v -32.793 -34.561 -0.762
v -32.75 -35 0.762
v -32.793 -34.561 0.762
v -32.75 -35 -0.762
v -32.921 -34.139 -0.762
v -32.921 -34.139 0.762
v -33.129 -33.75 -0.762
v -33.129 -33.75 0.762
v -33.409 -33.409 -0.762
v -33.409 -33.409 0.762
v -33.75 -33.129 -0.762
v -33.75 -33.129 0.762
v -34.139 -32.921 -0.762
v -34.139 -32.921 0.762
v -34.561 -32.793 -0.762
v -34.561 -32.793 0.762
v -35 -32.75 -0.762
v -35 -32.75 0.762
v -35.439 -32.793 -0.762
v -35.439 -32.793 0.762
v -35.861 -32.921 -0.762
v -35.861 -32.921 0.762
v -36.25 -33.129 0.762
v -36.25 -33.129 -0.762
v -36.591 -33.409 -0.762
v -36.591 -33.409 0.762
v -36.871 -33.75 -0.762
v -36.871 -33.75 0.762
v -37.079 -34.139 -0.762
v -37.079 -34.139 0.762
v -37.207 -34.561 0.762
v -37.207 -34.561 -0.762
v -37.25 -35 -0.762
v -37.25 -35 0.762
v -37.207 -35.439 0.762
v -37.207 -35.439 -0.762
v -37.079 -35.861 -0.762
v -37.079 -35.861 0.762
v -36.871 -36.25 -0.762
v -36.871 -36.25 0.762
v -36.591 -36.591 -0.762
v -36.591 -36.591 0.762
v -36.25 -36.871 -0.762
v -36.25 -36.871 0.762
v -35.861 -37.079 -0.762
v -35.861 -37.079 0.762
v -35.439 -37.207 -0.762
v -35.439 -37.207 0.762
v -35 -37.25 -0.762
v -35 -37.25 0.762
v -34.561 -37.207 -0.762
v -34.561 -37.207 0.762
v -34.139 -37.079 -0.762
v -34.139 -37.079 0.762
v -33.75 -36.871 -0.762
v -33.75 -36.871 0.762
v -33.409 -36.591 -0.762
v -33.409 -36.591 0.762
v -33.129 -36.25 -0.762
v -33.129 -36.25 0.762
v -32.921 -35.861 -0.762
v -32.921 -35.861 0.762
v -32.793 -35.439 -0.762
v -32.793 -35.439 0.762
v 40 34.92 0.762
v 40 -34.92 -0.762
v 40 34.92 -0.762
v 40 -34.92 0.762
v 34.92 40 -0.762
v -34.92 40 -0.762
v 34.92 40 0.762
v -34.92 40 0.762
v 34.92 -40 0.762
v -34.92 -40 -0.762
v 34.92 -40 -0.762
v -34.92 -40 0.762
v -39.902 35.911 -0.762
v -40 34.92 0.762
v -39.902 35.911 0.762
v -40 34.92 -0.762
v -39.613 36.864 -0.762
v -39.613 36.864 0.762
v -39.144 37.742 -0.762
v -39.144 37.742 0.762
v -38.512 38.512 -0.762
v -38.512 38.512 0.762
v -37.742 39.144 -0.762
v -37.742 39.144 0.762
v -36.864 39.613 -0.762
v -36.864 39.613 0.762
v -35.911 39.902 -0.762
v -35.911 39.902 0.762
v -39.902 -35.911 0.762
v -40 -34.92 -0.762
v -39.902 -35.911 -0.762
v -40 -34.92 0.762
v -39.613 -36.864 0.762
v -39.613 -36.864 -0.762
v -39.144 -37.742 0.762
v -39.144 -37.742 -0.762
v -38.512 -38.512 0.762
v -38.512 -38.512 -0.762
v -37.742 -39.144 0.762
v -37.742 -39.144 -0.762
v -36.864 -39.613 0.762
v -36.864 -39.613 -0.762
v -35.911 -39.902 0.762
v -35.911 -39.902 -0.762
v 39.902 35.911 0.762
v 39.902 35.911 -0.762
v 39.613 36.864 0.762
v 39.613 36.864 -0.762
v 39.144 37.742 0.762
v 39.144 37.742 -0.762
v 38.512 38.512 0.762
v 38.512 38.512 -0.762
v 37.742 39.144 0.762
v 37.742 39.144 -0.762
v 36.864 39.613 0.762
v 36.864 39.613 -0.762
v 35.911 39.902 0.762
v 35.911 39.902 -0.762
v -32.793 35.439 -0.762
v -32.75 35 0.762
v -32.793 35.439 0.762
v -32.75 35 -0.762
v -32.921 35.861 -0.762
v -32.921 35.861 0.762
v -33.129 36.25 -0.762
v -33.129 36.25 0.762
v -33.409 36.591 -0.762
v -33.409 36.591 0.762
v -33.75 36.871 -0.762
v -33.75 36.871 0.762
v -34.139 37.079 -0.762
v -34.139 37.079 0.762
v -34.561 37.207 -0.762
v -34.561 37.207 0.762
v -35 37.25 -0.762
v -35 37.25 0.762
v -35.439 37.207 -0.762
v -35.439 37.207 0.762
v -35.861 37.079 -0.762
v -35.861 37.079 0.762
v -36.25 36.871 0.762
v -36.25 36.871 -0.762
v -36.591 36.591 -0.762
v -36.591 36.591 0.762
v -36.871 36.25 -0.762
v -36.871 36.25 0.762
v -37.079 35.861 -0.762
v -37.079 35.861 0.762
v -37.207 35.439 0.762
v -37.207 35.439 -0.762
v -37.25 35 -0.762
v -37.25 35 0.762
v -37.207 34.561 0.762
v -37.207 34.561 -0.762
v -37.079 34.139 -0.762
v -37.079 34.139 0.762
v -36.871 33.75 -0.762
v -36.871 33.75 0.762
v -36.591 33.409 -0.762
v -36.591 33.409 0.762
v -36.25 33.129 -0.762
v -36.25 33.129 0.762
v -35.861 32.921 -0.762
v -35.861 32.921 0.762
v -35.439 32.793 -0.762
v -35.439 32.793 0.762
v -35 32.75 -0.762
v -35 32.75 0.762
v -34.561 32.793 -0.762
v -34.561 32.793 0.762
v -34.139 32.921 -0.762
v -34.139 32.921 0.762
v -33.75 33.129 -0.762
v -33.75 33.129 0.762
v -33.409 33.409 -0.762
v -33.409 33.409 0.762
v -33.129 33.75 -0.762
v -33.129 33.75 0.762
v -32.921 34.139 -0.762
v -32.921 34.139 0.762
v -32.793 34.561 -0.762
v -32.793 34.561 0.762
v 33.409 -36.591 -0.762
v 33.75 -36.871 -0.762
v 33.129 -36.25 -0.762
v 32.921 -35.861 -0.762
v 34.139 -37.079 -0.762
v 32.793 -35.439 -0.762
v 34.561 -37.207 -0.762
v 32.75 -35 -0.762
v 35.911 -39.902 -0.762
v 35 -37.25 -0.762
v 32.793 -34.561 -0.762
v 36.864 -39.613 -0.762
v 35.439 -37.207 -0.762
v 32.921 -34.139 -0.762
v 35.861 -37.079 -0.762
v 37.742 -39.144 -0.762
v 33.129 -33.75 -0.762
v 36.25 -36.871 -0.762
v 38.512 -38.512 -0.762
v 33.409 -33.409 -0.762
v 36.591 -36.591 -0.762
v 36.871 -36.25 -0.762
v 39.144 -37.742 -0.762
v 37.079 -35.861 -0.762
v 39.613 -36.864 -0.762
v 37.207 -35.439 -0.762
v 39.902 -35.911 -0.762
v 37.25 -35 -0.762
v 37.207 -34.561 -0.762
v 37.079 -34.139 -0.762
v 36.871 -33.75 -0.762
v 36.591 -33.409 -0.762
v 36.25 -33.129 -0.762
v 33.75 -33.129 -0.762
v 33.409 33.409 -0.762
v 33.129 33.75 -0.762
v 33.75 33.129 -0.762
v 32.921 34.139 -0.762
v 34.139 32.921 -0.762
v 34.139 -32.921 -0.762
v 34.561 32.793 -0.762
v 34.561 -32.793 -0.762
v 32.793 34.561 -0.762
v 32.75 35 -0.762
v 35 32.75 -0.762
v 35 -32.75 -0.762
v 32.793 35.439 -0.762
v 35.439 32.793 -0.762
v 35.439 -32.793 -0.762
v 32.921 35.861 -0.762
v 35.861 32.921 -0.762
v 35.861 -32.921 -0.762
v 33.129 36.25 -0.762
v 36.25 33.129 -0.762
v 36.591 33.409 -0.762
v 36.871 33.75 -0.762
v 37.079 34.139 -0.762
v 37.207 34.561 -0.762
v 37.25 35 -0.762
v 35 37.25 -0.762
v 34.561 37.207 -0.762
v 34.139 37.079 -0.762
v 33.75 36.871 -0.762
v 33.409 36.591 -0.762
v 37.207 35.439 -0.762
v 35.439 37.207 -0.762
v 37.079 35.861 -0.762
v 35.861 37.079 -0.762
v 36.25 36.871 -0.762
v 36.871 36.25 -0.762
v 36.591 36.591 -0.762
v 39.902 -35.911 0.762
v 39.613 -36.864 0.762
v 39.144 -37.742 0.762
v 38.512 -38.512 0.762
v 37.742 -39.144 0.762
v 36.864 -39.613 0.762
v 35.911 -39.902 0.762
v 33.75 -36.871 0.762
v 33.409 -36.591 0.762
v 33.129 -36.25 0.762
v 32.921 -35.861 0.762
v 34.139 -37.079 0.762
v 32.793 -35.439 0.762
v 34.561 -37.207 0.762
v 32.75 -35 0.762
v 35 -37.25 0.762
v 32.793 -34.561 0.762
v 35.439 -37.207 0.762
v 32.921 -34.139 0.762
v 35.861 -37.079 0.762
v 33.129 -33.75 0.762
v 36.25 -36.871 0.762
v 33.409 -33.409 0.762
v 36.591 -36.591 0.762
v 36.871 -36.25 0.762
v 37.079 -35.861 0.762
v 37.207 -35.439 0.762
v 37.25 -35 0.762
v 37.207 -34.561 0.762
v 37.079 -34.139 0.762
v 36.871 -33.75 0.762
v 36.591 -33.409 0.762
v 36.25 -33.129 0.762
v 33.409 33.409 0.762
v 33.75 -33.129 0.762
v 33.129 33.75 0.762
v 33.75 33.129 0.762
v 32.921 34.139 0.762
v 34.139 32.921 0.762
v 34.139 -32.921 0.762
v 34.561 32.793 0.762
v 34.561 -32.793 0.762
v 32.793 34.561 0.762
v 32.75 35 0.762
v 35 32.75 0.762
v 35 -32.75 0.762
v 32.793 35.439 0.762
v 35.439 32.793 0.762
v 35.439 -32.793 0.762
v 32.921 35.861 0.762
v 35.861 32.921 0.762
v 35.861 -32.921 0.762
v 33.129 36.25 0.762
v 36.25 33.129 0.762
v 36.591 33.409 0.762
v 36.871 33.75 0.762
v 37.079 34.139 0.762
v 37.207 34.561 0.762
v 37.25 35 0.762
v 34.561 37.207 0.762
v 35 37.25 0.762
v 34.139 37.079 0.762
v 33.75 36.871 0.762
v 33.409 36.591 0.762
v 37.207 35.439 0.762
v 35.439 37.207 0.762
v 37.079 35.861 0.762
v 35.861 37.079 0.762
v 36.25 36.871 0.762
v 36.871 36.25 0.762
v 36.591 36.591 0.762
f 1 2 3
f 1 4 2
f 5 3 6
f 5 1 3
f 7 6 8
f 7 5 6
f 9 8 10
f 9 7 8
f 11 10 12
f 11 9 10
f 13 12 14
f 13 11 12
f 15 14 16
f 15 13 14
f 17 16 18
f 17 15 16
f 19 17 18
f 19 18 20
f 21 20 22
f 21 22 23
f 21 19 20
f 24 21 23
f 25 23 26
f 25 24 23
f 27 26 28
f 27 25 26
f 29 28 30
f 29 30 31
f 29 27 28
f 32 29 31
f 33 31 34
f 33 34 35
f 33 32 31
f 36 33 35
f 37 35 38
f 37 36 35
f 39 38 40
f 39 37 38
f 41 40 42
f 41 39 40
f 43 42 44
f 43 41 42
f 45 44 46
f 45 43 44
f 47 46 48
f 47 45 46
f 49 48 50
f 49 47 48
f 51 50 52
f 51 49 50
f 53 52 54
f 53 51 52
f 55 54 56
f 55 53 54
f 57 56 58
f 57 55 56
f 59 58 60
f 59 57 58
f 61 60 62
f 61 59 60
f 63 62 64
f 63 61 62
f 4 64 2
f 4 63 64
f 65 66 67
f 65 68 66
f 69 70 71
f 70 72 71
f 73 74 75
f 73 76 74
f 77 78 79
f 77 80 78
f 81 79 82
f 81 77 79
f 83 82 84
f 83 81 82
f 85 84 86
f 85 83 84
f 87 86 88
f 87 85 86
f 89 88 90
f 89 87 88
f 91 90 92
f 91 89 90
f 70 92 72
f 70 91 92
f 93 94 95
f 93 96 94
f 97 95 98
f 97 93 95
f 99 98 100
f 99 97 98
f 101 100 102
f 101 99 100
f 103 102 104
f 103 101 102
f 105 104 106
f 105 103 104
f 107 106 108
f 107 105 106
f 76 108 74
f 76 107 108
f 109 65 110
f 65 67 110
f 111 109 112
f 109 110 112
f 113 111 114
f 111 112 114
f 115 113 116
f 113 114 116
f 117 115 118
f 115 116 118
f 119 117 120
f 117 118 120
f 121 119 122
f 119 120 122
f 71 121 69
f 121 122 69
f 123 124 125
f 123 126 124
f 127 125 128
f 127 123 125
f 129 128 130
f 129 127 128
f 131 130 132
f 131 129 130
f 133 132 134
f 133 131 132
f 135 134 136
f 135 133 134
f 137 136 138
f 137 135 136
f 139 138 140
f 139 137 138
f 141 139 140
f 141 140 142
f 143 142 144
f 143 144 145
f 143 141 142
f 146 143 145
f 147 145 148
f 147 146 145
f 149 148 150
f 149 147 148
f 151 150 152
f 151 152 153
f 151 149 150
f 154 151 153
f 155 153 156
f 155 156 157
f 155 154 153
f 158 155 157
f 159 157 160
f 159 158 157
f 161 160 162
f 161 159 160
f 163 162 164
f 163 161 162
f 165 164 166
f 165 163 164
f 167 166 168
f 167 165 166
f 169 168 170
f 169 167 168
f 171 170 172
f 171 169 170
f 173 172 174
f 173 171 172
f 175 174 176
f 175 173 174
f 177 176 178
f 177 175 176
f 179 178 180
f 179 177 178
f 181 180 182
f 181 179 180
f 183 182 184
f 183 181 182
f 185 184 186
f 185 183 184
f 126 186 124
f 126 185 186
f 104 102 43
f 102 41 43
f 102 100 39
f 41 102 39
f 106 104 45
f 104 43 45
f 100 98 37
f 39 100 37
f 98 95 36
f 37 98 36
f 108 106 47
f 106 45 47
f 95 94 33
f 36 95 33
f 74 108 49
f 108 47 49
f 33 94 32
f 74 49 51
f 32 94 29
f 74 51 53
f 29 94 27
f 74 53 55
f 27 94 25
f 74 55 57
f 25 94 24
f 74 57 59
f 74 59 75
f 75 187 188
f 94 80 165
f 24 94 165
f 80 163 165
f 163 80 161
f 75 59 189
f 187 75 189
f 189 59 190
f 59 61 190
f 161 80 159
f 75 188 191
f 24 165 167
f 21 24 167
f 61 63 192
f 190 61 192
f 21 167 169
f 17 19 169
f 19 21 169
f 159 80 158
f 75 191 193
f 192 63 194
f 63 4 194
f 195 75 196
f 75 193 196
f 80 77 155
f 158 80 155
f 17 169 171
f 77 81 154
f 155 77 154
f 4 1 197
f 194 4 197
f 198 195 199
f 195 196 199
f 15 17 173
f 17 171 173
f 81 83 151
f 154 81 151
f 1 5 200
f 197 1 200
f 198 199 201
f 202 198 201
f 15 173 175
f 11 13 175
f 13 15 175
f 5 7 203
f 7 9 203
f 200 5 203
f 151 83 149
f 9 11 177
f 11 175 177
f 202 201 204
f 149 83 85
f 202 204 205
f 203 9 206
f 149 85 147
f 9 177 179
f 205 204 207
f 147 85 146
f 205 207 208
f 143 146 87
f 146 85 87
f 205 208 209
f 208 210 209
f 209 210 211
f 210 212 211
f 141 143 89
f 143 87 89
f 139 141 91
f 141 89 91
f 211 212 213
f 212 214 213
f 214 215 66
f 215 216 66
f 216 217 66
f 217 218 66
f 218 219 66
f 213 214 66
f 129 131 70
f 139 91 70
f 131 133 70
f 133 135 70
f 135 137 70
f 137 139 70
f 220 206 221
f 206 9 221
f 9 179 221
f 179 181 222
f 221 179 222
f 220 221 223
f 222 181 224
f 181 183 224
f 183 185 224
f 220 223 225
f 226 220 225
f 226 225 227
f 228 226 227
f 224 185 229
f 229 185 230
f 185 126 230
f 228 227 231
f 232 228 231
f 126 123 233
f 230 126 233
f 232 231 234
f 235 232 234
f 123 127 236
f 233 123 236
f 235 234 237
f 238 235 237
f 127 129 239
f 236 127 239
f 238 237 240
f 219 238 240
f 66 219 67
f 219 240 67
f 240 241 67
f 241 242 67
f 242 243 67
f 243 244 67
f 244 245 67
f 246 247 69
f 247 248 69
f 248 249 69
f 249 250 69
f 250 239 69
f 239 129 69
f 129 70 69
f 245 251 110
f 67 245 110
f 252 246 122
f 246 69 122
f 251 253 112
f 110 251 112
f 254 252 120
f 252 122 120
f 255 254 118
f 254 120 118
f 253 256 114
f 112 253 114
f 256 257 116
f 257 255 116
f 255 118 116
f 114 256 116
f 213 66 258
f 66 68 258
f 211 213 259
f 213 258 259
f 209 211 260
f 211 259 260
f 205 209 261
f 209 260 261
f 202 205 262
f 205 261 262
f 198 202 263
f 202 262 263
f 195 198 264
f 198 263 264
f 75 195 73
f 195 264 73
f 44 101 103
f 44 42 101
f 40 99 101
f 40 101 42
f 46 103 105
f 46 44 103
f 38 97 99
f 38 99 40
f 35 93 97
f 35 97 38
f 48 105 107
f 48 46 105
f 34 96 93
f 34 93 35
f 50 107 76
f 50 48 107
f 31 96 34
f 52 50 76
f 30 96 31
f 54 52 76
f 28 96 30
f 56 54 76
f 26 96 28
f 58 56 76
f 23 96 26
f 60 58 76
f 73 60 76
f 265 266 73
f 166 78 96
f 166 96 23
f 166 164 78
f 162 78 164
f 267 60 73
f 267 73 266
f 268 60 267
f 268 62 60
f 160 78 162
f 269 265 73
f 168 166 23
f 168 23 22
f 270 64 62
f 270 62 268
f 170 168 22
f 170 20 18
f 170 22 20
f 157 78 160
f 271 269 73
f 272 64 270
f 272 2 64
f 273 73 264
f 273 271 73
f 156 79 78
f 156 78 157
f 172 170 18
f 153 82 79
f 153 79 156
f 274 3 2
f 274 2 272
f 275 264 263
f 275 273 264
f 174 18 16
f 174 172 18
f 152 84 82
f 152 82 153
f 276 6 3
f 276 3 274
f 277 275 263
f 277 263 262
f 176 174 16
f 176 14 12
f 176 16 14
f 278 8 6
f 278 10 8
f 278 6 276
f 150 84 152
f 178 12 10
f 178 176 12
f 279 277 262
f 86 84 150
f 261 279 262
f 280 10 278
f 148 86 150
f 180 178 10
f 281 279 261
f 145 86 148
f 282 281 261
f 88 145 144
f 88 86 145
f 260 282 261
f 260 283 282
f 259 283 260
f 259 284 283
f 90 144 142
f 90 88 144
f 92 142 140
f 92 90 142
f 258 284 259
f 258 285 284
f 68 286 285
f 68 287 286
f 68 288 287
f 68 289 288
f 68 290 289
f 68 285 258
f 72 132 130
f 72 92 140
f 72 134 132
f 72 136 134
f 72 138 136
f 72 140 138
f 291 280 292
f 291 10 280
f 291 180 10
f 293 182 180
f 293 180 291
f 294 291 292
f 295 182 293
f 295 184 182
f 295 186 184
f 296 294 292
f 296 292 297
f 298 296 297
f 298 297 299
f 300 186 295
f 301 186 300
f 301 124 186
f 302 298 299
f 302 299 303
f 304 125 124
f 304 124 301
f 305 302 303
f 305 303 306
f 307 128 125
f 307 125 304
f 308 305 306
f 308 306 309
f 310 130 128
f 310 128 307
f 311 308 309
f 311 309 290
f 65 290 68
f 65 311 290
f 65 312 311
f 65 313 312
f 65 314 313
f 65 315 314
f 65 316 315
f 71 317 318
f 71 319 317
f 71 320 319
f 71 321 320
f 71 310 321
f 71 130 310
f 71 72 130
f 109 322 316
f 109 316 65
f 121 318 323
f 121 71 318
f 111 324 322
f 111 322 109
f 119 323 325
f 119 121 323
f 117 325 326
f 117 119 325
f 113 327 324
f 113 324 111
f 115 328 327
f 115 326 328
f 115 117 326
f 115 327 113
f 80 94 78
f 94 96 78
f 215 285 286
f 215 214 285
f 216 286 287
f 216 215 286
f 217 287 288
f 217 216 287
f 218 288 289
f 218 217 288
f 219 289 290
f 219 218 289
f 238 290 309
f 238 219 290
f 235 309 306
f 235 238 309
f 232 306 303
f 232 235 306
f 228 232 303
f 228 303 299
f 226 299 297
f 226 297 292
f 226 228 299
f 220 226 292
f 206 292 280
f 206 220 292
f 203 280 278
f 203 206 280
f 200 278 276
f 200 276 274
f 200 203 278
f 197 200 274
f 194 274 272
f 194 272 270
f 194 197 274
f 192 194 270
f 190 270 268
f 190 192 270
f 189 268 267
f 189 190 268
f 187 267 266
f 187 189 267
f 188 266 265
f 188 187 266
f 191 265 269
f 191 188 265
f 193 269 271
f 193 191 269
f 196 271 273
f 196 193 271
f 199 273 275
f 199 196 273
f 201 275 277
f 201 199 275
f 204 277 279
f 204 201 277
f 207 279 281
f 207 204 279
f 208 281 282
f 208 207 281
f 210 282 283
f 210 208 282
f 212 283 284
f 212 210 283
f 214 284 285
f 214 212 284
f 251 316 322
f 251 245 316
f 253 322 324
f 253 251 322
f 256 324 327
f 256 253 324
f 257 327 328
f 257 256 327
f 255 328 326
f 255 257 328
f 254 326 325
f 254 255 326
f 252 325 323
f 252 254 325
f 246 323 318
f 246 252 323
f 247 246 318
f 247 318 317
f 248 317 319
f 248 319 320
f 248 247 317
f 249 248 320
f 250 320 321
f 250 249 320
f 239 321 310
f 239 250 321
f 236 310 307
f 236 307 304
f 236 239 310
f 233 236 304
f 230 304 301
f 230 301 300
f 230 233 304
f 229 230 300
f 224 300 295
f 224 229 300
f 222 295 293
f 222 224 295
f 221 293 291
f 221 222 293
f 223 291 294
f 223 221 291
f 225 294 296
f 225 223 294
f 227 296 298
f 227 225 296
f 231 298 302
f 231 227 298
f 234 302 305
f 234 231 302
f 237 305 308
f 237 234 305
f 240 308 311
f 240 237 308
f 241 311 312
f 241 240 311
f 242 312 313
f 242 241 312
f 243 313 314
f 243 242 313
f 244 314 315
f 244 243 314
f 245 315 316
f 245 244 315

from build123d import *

# Parameters (mm, degrees)
F0_W     = 80
F0_H     = 80
F0_R     = 2.25
F1_DEPTH = 0.762
F2_R     = 5.08


with BuildPart() as f1:
    # F0 (on Top) → F1 (new body, symmetric)
    with BuildSketch(Plane.XY):
        Rectangle(F0_W, F0_H)
        with Locations((-35, -35)):
            Circle(F0_R, mode=Mode.SUBTRACT)
        with Locations((35, -35)):
            Circle(F0_R, mode=Mode.SUBTRACT)
        with Locations((-35, 35)):
            Circle(F0_R, mode=Mode.SUBTRACT)
        with Locations((35, 35)):
            Circle(F0_R, mode=Mode.SUBTRACT)
    extrude(amount=F1_DEPTH, both=True)

    # F2
    f2_edges = [f1.edges().sort_by_distance(p)[0] for p in [
        (-40, -40, 0),
        (-40, 40, 0),
        (40, 40, 0),
        (40, -40, 0),
    ]]
    fillet(f2_edges, radius=F2_R)


solid = f1.part
